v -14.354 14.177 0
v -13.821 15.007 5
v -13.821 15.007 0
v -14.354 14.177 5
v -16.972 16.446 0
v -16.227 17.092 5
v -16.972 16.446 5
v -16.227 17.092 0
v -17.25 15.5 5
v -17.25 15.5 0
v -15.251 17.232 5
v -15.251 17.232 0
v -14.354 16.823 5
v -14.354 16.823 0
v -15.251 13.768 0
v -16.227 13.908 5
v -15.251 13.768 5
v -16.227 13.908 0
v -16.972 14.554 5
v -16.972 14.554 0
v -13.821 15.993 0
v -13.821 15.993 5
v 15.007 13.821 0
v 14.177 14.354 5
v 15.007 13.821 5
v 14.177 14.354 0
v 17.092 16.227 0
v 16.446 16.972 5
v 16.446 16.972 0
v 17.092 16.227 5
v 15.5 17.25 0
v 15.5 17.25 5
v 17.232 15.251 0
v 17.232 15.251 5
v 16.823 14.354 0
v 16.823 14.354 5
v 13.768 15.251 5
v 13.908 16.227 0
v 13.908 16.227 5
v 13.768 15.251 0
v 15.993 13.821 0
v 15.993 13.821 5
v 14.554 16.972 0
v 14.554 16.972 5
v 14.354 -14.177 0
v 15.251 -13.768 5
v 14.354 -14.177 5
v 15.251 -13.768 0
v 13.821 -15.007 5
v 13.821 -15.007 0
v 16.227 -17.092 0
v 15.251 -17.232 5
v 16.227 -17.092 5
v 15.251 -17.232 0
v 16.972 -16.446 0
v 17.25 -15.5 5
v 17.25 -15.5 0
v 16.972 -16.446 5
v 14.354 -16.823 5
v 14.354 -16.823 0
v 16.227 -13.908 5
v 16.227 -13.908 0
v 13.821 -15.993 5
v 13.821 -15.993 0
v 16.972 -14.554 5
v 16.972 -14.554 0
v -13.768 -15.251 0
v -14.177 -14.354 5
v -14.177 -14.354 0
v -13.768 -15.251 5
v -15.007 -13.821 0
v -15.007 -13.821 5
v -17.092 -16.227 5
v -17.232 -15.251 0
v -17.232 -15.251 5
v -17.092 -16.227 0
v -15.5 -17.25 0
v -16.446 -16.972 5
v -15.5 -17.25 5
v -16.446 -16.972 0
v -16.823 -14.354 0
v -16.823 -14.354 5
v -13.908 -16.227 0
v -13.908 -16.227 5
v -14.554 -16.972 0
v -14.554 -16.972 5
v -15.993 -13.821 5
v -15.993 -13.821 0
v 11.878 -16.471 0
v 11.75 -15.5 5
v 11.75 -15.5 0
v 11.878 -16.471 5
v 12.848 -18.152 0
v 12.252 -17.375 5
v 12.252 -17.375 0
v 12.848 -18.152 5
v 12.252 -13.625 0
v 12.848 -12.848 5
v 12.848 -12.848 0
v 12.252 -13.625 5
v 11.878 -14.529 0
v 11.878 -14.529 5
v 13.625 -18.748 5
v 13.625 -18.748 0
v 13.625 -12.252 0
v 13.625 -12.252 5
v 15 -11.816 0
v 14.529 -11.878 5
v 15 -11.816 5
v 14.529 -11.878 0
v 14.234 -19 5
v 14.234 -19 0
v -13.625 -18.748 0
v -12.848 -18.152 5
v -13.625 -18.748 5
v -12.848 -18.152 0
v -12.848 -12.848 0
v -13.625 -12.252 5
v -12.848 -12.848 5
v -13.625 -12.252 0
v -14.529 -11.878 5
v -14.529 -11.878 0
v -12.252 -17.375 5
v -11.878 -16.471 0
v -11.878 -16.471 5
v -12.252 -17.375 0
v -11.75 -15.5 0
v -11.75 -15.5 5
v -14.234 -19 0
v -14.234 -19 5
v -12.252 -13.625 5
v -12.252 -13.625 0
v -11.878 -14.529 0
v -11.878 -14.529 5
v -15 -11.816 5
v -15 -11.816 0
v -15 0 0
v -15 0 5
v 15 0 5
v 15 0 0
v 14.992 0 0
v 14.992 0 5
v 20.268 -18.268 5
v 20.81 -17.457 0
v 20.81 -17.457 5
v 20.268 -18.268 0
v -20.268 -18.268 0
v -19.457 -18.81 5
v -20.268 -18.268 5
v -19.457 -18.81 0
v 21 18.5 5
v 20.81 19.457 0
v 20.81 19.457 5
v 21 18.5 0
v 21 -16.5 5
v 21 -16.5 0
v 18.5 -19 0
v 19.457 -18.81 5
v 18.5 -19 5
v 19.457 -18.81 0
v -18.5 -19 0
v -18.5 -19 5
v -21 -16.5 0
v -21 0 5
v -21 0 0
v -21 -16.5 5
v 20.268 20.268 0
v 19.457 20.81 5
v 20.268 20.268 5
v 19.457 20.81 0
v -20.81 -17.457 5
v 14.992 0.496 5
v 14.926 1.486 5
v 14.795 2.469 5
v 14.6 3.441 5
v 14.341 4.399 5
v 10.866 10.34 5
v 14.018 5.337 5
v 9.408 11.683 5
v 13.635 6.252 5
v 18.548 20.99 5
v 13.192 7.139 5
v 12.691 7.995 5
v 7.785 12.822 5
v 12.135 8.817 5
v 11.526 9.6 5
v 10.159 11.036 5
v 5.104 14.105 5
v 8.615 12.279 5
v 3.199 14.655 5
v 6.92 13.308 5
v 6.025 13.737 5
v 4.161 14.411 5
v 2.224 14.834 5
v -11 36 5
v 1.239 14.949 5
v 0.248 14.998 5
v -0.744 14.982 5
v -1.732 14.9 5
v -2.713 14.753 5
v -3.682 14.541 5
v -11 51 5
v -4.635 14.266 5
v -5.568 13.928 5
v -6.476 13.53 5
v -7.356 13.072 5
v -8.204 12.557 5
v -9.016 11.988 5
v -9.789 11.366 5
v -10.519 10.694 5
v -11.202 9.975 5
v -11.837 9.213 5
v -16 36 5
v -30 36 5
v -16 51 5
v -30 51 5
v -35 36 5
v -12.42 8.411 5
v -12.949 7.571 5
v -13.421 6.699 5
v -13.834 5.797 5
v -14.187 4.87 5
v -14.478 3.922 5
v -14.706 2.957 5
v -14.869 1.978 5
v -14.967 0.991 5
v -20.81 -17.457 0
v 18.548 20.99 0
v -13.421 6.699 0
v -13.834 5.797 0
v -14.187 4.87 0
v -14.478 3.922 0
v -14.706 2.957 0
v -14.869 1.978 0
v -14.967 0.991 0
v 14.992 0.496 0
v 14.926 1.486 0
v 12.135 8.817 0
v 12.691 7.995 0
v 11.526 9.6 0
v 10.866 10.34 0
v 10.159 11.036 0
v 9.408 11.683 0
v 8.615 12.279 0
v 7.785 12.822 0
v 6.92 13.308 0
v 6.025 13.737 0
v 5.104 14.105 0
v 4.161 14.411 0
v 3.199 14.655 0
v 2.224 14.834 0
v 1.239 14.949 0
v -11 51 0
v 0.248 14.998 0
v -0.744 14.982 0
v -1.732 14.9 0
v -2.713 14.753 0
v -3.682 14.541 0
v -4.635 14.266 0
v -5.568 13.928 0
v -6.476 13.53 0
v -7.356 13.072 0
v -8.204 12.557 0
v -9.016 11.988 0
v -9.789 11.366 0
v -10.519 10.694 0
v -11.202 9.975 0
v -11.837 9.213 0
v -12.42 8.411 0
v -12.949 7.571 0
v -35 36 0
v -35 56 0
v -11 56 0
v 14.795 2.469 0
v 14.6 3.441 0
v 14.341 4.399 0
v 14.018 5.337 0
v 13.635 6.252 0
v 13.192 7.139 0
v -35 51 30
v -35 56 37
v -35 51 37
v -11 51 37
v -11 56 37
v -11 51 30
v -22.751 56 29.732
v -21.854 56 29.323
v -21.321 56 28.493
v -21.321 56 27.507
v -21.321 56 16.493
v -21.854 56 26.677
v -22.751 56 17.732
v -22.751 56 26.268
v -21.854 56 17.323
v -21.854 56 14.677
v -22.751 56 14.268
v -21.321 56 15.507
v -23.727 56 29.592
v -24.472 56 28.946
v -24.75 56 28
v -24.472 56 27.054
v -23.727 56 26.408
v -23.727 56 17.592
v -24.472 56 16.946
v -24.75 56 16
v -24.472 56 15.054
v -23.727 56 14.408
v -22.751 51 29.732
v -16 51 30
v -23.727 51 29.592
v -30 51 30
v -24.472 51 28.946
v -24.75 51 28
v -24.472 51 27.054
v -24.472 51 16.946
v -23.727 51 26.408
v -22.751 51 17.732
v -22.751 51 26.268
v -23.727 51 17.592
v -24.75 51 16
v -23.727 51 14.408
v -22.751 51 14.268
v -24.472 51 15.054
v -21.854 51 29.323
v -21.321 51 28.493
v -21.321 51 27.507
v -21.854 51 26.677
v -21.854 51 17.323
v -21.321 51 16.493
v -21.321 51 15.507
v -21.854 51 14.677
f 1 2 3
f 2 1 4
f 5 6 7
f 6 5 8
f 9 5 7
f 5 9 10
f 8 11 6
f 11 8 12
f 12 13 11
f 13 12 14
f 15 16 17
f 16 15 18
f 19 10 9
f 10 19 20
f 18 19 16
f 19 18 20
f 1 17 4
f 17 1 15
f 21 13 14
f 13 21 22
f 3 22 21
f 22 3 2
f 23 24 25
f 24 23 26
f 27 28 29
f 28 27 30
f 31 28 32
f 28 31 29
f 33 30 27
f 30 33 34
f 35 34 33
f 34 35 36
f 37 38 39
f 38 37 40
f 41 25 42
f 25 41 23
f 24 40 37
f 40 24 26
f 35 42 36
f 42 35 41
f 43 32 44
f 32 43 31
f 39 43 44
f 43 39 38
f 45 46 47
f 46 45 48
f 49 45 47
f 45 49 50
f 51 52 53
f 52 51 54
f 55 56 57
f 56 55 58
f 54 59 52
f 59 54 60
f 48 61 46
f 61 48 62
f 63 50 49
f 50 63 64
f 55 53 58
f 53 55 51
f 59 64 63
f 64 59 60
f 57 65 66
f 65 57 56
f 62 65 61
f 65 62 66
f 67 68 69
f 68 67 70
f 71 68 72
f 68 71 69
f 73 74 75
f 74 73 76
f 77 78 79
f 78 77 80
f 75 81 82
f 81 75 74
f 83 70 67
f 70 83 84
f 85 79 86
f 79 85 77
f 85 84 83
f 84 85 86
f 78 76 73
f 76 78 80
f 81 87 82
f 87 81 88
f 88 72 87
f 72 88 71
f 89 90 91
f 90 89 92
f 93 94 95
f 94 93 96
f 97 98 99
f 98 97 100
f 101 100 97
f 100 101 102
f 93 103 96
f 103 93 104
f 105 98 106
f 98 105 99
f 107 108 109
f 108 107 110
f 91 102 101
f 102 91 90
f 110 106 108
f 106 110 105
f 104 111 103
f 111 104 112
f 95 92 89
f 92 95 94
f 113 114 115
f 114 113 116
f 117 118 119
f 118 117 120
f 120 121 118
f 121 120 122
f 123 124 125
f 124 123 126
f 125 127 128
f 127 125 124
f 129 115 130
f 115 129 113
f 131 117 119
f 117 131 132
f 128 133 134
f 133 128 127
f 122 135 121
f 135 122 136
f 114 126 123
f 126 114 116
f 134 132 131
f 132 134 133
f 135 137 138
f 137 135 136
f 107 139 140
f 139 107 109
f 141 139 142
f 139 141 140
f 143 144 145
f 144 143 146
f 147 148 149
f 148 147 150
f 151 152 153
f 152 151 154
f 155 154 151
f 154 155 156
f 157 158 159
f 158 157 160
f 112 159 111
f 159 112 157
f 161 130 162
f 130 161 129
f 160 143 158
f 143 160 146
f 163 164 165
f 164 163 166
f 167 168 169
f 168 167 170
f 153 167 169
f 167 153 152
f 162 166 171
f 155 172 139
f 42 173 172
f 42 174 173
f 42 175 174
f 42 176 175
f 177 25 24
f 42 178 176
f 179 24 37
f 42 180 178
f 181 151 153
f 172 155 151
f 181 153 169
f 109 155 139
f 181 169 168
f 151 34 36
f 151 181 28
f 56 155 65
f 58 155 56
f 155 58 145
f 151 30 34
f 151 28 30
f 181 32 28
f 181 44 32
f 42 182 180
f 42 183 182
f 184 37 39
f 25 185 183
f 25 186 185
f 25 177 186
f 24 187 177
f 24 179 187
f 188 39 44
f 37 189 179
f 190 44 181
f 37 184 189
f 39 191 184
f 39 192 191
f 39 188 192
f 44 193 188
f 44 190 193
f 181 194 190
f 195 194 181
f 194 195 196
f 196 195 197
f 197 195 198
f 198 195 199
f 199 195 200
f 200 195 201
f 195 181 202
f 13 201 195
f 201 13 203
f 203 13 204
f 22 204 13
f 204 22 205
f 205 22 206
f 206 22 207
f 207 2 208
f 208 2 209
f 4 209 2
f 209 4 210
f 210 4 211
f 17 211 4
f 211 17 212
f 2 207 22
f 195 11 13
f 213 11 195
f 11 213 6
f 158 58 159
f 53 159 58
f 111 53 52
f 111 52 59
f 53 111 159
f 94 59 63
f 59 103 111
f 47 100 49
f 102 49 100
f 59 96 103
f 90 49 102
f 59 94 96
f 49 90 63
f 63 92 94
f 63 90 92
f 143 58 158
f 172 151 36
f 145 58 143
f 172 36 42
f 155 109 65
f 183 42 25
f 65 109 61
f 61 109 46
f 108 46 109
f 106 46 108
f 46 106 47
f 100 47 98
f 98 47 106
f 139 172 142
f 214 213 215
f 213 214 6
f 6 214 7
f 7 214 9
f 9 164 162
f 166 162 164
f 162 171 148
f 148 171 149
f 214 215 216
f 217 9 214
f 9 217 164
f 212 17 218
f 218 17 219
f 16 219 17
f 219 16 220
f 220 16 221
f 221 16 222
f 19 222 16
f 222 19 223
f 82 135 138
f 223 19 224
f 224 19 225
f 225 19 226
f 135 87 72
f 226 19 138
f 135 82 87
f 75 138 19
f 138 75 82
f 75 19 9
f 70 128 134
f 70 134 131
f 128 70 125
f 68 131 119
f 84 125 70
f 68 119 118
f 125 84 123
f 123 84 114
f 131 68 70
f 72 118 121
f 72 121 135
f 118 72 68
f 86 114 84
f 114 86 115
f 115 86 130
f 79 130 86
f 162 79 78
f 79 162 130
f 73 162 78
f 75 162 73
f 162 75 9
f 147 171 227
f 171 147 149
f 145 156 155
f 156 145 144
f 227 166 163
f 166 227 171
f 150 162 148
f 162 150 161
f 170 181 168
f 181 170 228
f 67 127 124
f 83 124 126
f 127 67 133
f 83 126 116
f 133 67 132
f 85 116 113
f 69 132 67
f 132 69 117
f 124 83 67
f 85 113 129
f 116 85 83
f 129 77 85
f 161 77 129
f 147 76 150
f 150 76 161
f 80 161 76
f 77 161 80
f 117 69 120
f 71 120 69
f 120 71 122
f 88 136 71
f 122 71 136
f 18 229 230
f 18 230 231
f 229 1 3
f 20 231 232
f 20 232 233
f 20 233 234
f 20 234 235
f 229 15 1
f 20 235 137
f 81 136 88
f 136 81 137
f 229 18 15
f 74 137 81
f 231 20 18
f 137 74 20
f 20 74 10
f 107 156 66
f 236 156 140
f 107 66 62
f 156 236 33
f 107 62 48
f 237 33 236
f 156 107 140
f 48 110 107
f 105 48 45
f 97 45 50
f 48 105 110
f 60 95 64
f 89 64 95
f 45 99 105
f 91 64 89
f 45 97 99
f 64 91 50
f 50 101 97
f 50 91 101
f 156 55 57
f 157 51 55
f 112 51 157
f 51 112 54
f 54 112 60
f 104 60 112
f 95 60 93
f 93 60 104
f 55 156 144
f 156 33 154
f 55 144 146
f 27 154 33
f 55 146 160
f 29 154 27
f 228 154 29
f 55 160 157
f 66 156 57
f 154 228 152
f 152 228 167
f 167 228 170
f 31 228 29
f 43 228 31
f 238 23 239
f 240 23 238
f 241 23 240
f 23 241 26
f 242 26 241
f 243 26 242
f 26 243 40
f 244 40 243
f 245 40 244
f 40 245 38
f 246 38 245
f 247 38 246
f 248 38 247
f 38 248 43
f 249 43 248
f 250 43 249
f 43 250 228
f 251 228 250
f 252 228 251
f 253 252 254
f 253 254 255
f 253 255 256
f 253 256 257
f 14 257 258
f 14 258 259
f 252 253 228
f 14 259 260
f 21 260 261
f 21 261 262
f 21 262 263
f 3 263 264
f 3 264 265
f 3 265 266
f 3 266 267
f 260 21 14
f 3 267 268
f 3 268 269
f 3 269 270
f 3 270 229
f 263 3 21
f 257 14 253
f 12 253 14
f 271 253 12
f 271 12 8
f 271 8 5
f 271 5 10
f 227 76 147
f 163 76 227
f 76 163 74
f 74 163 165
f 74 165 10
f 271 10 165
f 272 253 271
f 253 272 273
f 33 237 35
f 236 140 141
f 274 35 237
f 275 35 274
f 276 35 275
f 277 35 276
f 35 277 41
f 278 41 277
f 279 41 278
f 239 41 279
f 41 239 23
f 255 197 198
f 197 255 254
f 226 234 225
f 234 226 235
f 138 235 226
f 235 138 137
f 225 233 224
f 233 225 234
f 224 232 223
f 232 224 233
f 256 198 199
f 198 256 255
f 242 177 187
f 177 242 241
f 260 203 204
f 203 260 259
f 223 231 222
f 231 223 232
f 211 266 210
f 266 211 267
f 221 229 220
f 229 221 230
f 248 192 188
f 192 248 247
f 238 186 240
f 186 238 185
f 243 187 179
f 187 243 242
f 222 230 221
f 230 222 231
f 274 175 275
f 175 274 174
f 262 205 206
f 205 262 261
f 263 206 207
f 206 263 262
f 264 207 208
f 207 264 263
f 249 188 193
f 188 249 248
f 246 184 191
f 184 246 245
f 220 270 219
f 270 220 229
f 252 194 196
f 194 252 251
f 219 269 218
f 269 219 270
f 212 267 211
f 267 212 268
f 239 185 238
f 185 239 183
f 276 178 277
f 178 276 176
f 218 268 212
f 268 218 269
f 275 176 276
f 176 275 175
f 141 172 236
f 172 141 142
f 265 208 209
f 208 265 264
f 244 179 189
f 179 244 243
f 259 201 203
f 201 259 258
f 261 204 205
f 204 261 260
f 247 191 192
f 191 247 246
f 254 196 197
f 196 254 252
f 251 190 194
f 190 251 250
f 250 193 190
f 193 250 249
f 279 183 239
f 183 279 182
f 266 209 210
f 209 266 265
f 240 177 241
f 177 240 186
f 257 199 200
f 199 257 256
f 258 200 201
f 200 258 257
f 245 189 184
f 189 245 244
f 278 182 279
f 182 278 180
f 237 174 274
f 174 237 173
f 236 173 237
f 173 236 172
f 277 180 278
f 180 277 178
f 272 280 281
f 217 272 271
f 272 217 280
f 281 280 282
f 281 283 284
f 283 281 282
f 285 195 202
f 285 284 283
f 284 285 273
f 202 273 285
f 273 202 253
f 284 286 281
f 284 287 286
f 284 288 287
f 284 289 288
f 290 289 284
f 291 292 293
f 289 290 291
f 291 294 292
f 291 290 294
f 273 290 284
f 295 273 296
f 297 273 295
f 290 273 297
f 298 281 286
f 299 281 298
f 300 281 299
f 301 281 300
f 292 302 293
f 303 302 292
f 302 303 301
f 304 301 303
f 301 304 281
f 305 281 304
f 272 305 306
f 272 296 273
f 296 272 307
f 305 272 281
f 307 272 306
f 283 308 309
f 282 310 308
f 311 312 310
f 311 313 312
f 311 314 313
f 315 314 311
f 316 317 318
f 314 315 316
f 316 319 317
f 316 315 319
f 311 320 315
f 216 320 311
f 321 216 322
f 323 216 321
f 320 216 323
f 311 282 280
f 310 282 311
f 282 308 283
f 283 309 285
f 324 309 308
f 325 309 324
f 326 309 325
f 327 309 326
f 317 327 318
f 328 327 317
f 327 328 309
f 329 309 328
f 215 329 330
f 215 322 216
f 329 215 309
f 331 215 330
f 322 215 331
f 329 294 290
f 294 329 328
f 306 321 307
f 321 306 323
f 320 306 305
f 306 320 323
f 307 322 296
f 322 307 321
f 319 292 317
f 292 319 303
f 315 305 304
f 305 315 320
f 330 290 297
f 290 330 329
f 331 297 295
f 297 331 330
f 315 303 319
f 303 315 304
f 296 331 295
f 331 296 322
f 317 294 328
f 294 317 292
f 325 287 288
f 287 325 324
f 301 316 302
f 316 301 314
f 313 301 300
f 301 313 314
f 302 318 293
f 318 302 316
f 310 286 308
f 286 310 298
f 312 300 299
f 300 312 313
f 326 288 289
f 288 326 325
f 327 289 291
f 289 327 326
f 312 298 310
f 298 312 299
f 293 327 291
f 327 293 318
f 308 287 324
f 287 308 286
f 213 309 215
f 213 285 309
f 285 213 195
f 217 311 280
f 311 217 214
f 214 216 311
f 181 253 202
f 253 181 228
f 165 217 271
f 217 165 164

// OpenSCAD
// file: parameters.scad
tolerance = .2;

outer_width = 24;
outer_height = 15;

mid_depth = 6;

wall_thickness = 2;

key_diameter = 7;
key_depth = 1.1;
key_slope_bottom = 45;

clip_thickness = 2;
clip_curve_thickness = 1.75;

end_screw_hole_diameter = 3.5;

_trim = 1;

$fa = 3;
$fs = 1;
// main file
include<parameters.scad>

thickness = 5;

width = 42;
corner_diameter = 5;
screw_hole_xy = 15.5;
screw_hole_diameter = 3.5;

axle_hole_diameter = 30;

mount_offset_x = -10;
mount_offset_y = 30;
mount_width = outer_width;
mount_depth = 37;
mount_support_height = 15;
mount_support_depth = 25;

$fa = 3;
$fs = 1;

mirror([1,0,0])
union() {
    // motor mount
    difference() {
        // plate
        hull()
        union() {
            translate([(width-corner_diameter)/2, (width-corner_diameter)/2, 0])
            cylinder(d=corner_diameter, h=thickness);

            translate([-(width-corner_diameter)/2, (width-corner_diameter)/2, 0])
            cylinder(d=corner_diameter, h=thickness);

            translate([-(width-corner_diameter)/2, -(width-corner_diameter)/2+2, 0])
            cylinder(d=corner_diameter, h=thickness);

            translate([(width-corner_diameter)/2, -(width-corner_diameter)/2+2, 0])
            cylinder(d=corner_diameter, h=thickness);
        }

        // axle hole
        translate([0, 0, -.1])
        cylinder(d=axle_hole_diameter, h=thickness+.2);

        // screw holes
        for(r=[0, 90, 180, 270])
        rotate([0, 0, r])
        translate([screw_hole_xy, screw_hole_xy, -.1])
        cylinder(d=screw_hole_diameter, h=thickness+.2);

        // belt opening
        difference() {
            translate([-axle_hole_diameter/2, -axle_hole_diameter, -.1])
            cube([axle_hole_diameter, axle_hole_diameter, thickness + .2]);

            // screw holes
            for(r=[0, 90, 180, 270])
            rotate([0, 0, r])
            translate([screw_hole_xy, screw_hole_xy, -.1])
            cylinder(d=screw_hole_diameter+4, h=thickness+.2);
        }
    }

    // support
    translate([-width/2, width/2, 0])
    linear_extrude(height=thickness)
    polygon([
        [0, -corner_diameter/2],
        [width, -corner_diameter/2],
        [width, -width/2],
        [width+mount_offset_x+mount_width, mount_offset_y-mount_support_height],
        [width+mount_offset_x+mount_width, mount_offset_y],
        [width+mount_offset_x, mount_offset_y]
    ]);

    // mounting
    translate([width/2+mount_offset_x, width/2+mount_offset_y, 0])
    union() {
        difference () {
            // mount plate
            cube([mount_width, thickness, mount_depth]);

            translate([mount_width/2, -.1, outer_width/4+thickness*2])
            rotate([-90, 0, 0])
            cylinder(d=end_screw_hole_diameter, h=thickness+.2);

            translate([mount_width/2, -.1, outer_width/4*3+thickness*2])
            rotate([-90, 0, 0])
            cylinder(d=end_screw_hole_diameter, h=thickness+.2);
        }

        // left mount support (from global above)
        translate([thickness, -mount_support_height, thickness])
        rotate([0, -90, 0])
        linear_extrude(height=thickness)
        polygon([
            [0, 0],
            [0, mount_support_height],
            [mount_support_depth, mount_support_height]
        ]);

        // right mount support (from global above)
        translate([mount_width, -mount_support_height, thickness])
        rotate([0, -90, 0])
        linear_extrude(height=thickness)
        polygon([
            [0, 0],
            [0, mount_support_height],
            [mount_support_depth, mount_support_height]
        ]);
    }
}
